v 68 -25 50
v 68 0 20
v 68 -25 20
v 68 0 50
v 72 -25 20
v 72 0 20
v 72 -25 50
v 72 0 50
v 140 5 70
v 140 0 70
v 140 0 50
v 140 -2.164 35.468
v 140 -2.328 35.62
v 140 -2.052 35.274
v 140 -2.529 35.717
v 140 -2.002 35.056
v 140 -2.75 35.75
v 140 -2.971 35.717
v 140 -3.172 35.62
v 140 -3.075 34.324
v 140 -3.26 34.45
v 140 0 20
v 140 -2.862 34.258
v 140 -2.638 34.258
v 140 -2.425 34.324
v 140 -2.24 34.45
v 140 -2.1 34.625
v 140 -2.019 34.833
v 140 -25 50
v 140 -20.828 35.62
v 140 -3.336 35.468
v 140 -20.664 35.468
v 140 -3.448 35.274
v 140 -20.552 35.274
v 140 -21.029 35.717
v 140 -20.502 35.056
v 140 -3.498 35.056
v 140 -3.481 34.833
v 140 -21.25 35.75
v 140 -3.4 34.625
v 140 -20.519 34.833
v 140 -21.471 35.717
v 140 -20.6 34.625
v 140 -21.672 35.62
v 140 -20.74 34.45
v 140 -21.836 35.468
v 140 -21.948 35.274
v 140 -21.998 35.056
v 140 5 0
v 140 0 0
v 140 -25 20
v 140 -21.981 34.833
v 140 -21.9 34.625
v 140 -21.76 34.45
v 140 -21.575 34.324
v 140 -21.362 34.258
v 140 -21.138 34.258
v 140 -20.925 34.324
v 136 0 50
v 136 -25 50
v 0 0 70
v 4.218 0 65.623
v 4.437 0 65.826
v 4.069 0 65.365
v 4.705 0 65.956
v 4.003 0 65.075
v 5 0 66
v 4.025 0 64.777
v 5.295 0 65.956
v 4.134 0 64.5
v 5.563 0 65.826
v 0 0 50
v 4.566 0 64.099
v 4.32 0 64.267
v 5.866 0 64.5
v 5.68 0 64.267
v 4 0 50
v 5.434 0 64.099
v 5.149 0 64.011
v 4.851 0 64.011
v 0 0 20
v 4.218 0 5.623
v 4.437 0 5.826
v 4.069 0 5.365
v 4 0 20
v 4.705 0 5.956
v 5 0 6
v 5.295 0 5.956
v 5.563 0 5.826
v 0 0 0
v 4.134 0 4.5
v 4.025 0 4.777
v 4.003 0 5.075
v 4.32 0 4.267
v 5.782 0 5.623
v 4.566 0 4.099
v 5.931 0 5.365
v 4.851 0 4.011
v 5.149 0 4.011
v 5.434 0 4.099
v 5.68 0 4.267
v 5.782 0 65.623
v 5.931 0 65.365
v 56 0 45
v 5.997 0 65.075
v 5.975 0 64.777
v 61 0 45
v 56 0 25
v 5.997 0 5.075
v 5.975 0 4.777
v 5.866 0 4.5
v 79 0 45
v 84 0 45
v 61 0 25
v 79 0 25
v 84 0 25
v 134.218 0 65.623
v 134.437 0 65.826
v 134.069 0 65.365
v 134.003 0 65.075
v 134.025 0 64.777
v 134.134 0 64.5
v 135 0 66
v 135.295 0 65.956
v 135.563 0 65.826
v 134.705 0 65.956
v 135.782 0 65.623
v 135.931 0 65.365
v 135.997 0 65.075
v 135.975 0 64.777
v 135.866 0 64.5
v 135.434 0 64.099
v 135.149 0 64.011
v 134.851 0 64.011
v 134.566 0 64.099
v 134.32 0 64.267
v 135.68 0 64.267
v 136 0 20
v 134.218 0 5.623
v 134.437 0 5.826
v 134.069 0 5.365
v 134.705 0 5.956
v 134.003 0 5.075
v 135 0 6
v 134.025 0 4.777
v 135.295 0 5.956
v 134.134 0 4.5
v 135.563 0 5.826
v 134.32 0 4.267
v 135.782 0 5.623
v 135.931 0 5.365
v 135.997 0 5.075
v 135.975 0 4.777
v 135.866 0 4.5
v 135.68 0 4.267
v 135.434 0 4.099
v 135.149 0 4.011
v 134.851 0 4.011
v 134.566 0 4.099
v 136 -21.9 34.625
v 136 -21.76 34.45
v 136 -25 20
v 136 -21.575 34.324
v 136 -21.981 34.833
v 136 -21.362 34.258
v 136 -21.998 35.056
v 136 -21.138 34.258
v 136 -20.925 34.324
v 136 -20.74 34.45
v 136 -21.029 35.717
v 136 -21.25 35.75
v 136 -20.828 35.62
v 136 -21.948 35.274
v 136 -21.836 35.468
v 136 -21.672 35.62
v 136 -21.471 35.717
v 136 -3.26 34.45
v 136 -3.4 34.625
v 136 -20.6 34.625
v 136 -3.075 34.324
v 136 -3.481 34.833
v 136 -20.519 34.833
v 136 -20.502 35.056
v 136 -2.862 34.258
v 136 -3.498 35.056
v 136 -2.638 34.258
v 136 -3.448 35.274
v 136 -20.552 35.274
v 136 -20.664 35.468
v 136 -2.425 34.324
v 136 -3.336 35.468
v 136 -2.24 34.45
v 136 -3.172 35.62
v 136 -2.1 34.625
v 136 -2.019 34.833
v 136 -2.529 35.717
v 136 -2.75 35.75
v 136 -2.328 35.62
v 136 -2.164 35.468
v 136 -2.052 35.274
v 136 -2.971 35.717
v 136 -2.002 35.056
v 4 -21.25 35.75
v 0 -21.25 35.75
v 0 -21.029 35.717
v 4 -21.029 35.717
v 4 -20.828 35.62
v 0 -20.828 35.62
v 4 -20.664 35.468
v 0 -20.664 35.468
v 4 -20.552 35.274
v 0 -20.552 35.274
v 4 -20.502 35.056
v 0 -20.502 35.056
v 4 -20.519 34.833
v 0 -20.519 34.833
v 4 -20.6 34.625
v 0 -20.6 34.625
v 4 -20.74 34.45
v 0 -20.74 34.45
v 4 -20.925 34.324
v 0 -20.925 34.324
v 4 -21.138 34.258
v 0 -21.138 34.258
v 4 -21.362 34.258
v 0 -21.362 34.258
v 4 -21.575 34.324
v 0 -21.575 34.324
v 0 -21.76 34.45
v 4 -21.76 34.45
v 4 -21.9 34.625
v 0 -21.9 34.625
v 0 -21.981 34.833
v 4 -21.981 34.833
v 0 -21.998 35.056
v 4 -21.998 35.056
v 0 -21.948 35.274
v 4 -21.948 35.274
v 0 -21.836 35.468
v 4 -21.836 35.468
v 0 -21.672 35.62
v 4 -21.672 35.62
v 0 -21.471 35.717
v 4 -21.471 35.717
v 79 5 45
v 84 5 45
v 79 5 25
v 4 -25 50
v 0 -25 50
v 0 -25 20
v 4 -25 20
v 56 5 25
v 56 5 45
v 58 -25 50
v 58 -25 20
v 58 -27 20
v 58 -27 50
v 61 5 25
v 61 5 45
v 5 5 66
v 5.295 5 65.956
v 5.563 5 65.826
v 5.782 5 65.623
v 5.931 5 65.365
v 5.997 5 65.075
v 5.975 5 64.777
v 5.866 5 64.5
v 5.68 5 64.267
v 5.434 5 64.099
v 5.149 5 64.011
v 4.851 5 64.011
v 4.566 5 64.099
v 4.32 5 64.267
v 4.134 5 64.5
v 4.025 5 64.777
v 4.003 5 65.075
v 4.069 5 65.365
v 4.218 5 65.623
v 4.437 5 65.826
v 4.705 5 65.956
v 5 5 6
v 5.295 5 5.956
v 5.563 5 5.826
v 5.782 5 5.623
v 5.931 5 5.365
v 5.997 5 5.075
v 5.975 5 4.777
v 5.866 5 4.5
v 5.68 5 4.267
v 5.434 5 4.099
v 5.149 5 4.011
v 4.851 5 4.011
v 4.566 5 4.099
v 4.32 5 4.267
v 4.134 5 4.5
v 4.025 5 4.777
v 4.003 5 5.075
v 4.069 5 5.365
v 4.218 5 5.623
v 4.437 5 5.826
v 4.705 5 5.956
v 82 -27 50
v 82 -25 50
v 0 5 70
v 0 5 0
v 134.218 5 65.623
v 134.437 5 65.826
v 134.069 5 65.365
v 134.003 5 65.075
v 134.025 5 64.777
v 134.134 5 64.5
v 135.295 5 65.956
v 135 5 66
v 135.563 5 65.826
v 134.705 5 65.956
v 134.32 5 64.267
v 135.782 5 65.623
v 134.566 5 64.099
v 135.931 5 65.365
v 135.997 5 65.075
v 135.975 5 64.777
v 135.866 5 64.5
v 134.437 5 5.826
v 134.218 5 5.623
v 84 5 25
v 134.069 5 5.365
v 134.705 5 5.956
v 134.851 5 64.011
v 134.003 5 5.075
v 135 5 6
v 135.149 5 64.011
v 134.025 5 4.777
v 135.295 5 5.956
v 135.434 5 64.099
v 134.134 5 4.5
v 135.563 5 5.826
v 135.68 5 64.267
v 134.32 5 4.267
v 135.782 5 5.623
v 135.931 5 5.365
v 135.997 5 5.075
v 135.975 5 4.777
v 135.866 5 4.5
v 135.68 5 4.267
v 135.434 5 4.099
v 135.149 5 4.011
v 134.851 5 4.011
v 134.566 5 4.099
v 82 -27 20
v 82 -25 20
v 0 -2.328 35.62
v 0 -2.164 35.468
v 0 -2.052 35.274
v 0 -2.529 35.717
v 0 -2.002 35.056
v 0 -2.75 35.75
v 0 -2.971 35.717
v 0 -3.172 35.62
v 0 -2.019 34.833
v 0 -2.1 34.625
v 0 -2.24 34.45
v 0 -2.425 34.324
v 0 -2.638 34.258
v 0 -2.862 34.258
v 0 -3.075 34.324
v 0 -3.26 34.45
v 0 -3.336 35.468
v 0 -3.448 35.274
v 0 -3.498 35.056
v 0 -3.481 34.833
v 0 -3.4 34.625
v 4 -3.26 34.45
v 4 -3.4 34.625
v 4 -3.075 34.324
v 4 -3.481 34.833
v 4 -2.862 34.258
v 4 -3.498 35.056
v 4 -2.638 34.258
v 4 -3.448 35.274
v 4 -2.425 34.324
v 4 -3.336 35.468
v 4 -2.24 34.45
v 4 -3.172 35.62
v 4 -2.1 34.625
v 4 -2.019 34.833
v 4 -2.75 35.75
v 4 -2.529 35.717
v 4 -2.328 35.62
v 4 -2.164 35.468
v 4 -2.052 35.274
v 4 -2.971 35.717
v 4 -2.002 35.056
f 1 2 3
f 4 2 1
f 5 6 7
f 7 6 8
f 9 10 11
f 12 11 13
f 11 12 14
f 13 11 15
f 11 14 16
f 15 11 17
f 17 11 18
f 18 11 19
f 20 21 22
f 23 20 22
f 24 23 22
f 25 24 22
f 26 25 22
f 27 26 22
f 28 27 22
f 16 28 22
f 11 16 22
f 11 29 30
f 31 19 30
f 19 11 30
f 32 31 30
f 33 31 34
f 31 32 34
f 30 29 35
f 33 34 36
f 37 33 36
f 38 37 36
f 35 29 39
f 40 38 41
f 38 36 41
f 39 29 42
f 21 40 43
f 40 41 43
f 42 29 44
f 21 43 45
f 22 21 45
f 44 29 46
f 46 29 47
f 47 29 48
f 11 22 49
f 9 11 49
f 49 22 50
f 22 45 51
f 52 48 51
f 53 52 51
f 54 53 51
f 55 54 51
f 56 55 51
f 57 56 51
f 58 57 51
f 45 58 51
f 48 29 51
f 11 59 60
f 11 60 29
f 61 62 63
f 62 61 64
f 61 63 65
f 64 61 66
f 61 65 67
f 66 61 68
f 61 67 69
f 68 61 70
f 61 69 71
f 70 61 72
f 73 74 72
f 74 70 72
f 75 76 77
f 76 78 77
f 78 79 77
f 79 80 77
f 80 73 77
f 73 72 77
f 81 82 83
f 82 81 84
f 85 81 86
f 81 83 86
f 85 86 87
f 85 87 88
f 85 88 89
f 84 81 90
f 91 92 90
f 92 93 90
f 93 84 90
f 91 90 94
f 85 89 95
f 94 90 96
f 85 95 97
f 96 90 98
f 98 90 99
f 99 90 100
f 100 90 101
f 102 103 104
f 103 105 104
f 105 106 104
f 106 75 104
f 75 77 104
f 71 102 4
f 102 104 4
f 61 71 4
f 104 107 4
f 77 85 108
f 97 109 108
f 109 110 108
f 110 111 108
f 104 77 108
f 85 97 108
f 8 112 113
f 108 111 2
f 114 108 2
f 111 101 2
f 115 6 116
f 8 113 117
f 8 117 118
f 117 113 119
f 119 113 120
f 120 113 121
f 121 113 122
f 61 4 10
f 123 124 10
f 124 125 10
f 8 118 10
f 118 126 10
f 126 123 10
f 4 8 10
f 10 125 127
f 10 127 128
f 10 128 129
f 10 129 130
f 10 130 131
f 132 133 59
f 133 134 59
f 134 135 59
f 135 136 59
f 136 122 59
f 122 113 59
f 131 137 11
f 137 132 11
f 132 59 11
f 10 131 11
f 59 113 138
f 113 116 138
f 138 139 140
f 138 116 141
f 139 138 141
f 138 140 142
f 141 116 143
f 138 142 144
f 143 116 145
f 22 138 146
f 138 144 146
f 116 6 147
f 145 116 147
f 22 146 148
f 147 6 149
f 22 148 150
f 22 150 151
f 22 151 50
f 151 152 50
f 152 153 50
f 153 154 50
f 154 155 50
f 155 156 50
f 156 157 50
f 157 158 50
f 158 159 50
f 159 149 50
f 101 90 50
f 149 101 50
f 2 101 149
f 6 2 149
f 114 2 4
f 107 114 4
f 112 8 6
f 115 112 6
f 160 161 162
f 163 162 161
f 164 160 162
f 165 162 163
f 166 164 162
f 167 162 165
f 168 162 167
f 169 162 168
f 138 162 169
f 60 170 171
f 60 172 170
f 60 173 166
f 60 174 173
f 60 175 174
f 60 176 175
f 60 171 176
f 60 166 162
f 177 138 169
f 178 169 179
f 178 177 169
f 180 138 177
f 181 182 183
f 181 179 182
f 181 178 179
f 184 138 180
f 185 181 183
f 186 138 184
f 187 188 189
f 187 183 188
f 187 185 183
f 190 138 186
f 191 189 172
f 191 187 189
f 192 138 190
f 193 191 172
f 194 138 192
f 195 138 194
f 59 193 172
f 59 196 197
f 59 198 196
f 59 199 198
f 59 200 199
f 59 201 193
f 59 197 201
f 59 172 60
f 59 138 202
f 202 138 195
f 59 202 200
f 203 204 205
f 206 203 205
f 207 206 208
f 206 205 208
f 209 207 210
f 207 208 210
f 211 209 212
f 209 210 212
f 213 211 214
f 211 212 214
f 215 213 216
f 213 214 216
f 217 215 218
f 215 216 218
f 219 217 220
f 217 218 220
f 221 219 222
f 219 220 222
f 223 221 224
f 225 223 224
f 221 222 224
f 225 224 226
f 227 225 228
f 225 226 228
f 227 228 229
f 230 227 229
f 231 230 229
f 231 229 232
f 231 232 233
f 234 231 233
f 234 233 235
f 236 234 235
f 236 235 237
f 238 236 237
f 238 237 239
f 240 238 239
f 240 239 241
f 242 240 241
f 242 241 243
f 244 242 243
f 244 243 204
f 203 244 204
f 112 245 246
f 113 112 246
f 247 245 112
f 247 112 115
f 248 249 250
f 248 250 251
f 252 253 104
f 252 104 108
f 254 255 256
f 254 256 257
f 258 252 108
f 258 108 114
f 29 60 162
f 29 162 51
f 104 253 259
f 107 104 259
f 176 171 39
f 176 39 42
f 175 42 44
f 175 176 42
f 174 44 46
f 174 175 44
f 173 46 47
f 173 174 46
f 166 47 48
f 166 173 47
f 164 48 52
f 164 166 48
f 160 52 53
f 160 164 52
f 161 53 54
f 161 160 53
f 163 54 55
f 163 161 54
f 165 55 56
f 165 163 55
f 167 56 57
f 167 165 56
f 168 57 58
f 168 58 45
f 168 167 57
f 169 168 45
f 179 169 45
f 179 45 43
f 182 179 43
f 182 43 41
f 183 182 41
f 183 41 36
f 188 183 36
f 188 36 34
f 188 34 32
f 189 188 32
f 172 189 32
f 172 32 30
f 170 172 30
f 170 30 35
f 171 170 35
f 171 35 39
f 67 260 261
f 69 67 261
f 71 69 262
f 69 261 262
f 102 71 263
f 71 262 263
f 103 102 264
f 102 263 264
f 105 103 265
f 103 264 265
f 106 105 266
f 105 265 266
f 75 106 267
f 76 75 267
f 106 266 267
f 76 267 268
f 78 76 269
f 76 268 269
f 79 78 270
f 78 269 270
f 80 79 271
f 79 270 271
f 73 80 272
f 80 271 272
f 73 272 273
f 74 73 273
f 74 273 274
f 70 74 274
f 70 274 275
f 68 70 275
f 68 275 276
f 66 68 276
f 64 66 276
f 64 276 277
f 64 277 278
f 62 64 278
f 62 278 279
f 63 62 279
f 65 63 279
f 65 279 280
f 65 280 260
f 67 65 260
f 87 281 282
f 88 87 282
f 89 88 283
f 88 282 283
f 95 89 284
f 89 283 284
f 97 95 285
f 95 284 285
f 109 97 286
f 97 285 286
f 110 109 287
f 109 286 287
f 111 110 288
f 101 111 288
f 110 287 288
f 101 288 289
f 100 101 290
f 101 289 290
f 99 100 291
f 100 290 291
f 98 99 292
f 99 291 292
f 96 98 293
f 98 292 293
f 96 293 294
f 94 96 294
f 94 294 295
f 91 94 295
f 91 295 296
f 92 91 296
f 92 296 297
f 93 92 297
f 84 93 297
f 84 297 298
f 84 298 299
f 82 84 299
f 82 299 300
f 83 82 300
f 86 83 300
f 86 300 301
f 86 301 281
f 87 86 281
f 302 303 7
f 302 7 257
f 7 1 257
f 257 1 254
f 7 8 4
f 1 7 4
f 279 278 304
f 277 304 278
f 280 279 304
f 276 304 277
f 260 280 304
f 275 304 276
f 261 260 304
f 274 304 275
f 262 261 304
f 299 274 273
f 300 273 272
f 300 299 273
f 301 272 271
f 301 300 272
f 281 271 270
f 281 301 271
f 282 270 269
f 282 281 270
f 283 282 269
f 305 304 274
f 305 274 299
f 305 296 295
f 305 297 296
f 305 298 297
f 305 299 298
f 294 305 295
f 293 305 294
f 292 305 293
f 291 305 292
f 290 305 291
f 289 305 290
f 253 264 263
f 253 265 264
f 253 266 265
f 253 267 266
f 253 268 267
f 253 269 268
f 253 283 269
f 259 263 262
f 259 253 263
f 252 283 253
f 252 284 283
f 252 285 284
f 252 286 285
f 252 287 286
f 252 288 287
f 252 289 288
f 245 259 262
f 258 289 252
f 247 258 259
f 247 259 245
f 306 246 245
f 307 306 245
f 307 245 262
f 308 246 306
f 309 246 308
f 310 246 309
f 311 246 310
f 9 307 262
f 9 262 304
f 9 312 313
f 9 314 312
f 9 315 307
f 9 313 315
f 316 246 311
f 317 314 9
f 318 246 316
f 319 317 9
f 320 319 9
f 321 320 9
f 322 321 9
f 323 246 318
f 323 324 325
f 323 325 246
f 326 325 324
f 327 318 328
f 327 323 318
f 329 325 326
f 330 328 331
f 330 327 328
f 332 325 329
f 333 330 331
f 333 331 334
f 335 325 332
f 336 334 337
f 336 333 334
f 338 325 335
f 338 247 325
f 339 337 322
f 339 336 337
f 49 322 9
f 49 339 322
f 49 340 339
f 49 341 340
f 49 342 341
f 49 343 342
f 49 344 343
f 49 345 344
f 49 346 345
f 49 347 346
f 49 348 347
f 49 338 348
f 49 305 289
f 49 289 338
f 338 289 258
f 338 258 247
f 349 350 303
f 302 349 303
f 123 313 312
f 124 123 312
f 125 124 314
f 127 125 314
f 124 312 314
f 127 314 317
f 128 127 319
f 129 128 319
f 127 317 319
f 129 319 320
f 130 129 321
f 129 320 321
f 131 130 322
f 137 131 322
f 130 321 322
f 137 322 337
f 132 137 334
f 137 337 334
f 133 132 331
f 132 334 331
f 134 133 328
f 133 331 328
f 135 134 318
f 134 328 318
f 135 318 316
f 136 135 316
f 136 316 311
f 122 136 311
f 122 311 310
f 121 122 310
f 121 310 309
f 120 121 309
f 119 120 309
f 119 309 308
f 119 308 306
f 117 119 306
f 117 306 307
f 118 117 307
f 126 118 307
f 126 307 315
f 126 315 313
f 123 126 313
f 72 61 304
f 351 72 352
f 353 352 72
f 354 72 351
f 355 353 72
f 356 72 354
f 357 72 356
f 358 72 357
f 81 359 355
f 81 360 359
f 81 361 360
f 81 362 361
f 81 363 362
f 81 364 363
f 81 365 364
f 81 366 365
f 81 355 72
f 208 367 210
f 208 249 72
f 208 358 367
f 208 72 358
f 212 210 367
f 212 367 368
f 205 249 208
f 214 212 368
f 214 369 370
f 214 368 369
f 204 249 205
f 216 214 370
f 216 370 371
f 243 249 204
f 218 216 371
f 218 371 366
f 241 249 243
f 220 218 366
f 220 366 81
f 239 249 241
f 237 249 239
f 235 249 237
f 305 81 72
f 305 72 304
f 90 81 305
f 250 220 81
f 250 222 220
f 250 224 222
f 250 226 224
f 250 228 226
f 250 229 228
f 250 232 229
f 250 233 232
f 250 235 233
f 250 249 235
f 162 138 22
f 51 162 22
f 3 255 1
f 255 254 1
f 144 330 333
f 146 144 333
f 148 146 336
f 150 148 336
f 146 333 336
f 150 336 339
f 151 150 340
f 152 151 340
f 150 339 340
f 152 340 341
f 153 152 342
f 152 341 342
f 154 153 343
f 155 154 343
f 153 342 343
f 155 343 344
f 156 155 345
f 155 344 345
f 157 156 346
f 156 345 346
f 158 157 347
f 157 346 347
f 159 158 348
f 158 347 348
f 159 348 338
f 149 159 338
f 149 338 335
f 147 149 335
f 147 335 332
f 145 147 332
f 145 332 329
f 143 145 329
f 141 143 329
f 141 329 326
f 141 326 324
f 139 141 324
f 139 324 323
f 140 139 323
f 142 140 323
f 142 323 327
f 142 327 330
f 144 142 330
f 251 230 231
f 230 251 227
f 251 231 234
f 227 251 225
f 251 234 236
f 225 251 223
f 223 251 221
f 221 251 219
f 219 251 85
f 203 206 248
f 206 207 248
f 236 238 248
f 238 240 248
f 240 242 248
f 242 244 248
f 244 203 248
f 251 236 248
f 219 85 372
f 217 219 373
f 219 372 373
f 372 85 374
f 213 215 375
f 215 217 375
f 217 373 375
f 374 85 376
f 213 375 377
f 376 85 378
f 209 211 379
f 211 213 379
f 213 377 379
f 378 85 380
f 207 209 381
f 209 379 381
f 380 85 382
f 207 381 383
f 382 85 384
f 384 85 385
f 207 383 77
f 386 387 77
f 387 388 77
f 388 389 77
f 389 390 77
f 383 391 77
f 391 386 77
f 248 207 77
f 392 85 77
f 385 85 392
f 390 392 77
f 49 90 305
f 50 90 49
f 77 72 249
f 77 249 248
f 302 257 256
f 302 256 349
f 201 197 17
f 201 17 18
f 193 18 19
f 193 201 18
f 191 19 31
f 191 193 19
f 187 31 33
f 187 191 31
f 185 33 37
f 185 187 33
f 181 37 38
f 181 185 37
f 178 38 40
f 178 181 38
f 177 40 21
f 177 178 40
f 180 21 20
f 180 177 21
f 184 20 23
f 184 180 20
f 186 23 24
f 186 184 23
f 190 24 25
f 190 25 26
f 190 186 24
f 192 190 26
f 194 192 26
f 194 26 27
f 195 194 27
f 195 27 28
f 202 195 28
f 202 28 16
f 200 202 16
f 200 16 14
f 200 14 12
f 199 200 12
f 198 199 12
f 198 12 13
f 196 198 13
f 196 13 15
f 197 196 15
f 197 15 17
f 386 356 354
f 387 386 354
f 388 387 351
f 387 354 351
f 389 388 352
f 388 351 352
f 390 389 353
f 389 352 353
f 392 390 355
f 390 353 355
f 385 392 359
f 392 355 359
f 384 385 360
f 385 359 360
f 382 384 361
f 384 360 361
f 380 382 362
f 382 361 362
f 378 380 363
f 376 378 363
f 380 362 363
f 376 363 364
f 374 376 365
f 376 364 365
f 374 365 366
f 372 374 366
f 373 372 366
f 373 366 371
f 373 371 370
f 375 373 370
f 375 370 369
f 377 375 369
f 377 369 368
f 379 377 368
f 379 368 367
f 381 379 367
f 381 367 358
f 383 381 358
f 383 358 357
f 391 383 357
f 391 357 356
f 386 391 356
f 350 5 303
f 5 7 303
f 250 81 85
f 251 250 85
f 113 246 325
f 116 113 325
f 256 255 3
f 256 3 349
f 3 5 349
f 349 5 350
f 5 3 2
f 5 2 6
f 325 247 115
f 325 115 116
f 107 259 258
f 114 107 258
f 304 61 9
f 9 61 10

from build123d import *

# Parameters (mm, degrees)
SZKIC1_W                    = 140
SZKIC1_H                    = 70
DODANIE_WYCI_GNI_CIE1_DEPTH = 5
SZKIC2_W                    = 4
SZKIC2_H                    = 30
DODANIE_WYCI_GNI_CIE2_DEPTH = 25
SZKIC3_W                    = 10
SZKIC3_H                    = 30
SZKIC3_W_2                  = 2
DODANIE_WYCI_GNI_CIE3_DEPTH = 2
SZKIC4_R                    = 0.75
WYTNIJ_WYCI_GNI_CIE1_DEPTH  = 12
WYTNIJ_WYCI_GNI_CIE2_START  = -12
SZKIC5_R                    = 0.75
WYTNIJ_WYCI_GNI_CIE2_DEPTH  = 12
SZKIC6_W                    = 5
SZKIC6_H                    = 20
WYTNIJ_WYCI_GNI_CIE3_DEPTH  = 12
SZKIC8_R                    = 1
WYTNIJ_WYCI_GNI_CIE4_DEPTH  = 12


with BuildPart() as part:
    # Szkic1 → Dodanie-wyciągnięcie1 (new body)
    with BuildSketch(Plane(origin=(0, 0, 0), x_dir=(1, 0, 0), z_dir=(0, 1, 0))):
        with Locations((70, -35)):
            Rectangle(SZKIC1_W, SZKIC1_H)
    extrude(amount=DODANIE_WYCI_GNI_CIE1_DEPTH)

    # Szkic2 → Dodanie-wyciągnięcie2 (add)
    with BuildSketch(Plane.XZ):
        with Locations((2, 35)):
            Rectangle(SZKIC2_W, SZKIC2_H)
        with Locations((138, 35)):
            Rectangle(SZKIC2_W, SZKIC2_H)
        with Locations((70, 35)):
            Rectangle(SZKIC2_W, SZKIC2_H)
    extrude(amount=DODANIE_WYCI_GNI_CIE2_DEPTH)

    # Szkic3 → Dodanie-wyciągnięcie3 (add)
    with BuildSketch(Plane.XZ.offset(25)):
        with Locations((77, 35)):
            Rectangle(SZKIC3_W, SZKIC3_H)
        with Locations((63, 35)):
            Rectangle(SZKIC3_W, SZKIC3_H)
        with Locations((71, 35)):
            Rectangle(SZKIC3_W_2, SZKIC3_H)
        with Locations((69, 35)):
            Rectangle(SZKIC3_W_2, SZKIC3_H)
    extrude(amount=DODANIE_WYCI_GNI_CIE3_DEPTH)

    # Szkic4 → Wytnij-wyciągnięcie1 (cut)
    with BuildSketch(Plane.ZY):
        with Locations((35, -2.75)):
            Circle(SZKIC4_R)
        with Locations((35, -21.25)):
            Circle(SZKIC4_R)
    extrude(amount=-WYTNIJ_WYCI_GNI_CIE1_DEPTH, mode=Mode.SUBTRACT)

    # Szkic5 → Wytnij-wyciągnięcie2 (cut)
    with BuildSketch(Plane(origin=(140, 0, 0), x_dir=(0, 0, -1), z_dir=(1, 0, 0)).offset(WYTNIJ_WYCI_GNI_CIE2_START)):
        with Locations(Location((-35, -21.25, 0), (0, 0, 180))):
            Circle(SZKIC5_R)
        with Locations(Location((-35, -2.75, 0), (0, 0, 180))):
            Circle(SZKIC5_R)
    extrude(amount=WYTNIJ_WYCI_GNI_CIE2_DEPTH, mode=Mode.SUBTRACT)

    # Szkic6 → Wytnij-wyciągnięcie3 (cut)
    with BuildSketch(Plane(origin=(0, 5, 0), x_dir=(1, 0, 0), z_dir=(0, 1, 0))):
        with Locations((58.5, -35)):
            Rectangle(SZKIC6_W, SZKIC6_H)
        with Locations((81.5, -35)):
            Rectangle(SZKIC6_W, SZKIC6_H)
    extrude(amount=-WYTNIJ_WYCI_GNI_CIE3_DEPTH, mode=Mode.SUBTRACT)

    # Szkic8 → Wytnij-wyciągnięcie4 (cut)
    with BuildSketch(Plane(origin=(0, 5, 0), x_dir=(1, 0, 0), z_dir=(0, 1, 0))):
        with Locations(Location((135, -65, 0), (0, 0, 270))):
            Circle(SZKIC8_R)
        with Locations(Location((135, -5, 0), (0, 0, 270))):
            Circle(SZKIC8_R)
        with Locations(Location((5, -5, 0), (0, 0, 270))):
            Circle(SZKIC8_R)
        with Locations(Location((5, -65, 0), (0, 0, 270))):
            Circle(SZKIC8_R)
    extrude(amount=-WYTNIJ_WYCI_GNI_CIE4_DEPTH, mode=Mode.SUBTRACT)


solid = part.part
